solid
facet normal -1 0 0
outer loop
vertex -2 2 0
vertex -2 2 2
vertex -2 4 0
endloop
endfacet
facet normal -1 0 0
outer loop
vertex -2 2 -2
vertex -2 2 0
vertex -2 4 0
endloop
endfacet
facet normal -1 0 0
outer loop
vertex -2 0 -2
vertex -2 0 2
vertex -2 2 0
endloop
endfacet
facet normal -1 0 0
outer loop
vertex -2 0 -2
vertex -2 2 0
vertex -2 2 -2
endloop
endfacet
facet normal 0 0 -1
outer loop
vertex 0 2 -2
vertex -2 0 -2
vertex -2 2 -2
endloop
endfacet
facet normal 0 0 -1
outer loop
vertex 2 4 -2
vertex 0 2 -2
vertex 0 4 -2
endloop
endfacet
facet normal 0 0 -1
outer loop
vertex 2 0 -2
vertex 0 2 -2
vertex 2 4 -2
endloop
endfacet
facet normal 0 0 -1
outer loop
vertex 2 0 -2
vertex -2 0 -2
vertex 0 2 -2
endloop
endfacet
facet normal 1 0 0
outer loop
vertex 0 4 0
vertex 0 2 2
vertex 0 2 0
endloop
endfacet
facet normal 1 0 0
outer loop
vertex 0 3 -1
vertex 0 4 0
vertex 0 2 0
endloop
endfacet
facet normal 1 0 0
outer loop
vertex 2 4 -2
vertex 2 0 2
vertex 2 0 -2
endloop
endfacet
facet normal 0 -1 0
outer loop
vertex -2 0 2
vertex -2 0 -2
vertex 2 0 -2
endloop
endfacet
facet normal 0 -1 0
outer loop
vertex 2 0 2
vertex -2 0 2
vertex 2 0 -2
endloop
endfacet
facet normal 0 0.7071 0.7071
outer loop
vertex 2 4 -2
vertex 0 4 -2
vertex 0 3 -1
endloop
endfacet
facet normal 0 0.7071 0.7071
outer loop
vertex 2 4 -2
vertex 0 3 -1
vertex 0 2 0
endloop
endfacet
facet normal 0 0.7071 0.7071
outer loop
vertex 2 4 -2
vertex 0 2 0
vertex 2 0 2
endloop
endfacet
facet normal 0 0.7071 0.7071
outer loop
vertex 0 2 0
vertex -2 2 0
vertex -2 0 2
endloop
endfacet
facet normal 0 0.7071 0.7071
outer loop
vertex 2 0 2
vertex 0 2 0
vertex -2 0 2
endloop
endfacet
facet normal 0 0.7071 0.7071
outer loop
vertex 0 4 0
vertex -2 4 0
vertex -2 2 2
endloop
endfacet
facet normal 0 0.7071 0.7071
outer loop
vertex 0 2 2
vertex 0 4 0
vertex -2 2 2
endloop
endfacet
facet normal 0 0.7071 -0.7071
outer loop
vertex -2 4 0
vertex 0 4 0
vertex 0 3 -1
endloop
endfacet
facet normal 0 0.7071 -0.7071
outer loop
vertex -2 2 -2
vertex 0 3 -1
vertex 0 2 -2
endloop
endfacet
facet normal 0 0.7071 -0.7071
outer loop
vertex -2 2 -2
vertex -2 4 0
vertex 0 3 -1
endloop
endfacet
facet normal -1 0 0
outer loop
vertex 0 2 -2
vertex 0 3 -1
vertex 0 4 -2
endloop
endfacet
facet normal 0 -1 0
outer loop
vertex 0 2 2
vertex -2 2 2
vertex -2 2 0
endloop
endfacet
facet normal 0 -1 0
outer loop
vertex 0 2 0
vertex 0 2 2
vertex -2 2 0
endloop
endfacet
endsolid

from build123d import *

# Parameters (mm, degrees)
SKETCH1_W           = 4
SKETCH1_H           = 4
BOSS_EXTRUDE1_DEPTH = 4
CUT_EXTRUDE1_DEPTH  = 2
CUT_EXTRUDE2_DEPTH  = 2


with BuildPart() as part:
    # Sketch1 → Boss-Extrude1 (new body)
    with BuildSketch(Plane(origin=(0, 0, 0), x_dir=(1, 0, 0), z_dir=(0, 1, 0))):
        Rectangle(SKETCH1_W, SKETCH1_H)
    extrude(amount=BOSS_EXTRUDE1_DEPTH)

    # Sketch2 → Cut-Extrude1 (cut)
    with BuildSketch(Plane.ZY.offset(2)):
        Polygon((0, 2), (2, 0), (2, 2), align=None)
        Polygon((0, 4), (2, 2), (2, 4), align=None)
        Polygon((0, 4), (-2, 2), (-2, 4), align=None)
    extrude(amount=-CUT_EXTRUDE1_DEPTH, mode=Mode.SUBTRACT)

    # Sketch3 → Cut-Extrude2 (cut)
    with BuildSketch(Plane(origin=(2, 0, 0), x_dir=(0, 0, -1), z_dir=(1, 0, 0))):
        Polygon((-2, 0), (2, 4), (-2, 4.116557223), align=None)
    extrude(amount=-CUT_EXTRUDE2_DEPTH, mode=Mode.SUBTRACT)


solid = part.part
